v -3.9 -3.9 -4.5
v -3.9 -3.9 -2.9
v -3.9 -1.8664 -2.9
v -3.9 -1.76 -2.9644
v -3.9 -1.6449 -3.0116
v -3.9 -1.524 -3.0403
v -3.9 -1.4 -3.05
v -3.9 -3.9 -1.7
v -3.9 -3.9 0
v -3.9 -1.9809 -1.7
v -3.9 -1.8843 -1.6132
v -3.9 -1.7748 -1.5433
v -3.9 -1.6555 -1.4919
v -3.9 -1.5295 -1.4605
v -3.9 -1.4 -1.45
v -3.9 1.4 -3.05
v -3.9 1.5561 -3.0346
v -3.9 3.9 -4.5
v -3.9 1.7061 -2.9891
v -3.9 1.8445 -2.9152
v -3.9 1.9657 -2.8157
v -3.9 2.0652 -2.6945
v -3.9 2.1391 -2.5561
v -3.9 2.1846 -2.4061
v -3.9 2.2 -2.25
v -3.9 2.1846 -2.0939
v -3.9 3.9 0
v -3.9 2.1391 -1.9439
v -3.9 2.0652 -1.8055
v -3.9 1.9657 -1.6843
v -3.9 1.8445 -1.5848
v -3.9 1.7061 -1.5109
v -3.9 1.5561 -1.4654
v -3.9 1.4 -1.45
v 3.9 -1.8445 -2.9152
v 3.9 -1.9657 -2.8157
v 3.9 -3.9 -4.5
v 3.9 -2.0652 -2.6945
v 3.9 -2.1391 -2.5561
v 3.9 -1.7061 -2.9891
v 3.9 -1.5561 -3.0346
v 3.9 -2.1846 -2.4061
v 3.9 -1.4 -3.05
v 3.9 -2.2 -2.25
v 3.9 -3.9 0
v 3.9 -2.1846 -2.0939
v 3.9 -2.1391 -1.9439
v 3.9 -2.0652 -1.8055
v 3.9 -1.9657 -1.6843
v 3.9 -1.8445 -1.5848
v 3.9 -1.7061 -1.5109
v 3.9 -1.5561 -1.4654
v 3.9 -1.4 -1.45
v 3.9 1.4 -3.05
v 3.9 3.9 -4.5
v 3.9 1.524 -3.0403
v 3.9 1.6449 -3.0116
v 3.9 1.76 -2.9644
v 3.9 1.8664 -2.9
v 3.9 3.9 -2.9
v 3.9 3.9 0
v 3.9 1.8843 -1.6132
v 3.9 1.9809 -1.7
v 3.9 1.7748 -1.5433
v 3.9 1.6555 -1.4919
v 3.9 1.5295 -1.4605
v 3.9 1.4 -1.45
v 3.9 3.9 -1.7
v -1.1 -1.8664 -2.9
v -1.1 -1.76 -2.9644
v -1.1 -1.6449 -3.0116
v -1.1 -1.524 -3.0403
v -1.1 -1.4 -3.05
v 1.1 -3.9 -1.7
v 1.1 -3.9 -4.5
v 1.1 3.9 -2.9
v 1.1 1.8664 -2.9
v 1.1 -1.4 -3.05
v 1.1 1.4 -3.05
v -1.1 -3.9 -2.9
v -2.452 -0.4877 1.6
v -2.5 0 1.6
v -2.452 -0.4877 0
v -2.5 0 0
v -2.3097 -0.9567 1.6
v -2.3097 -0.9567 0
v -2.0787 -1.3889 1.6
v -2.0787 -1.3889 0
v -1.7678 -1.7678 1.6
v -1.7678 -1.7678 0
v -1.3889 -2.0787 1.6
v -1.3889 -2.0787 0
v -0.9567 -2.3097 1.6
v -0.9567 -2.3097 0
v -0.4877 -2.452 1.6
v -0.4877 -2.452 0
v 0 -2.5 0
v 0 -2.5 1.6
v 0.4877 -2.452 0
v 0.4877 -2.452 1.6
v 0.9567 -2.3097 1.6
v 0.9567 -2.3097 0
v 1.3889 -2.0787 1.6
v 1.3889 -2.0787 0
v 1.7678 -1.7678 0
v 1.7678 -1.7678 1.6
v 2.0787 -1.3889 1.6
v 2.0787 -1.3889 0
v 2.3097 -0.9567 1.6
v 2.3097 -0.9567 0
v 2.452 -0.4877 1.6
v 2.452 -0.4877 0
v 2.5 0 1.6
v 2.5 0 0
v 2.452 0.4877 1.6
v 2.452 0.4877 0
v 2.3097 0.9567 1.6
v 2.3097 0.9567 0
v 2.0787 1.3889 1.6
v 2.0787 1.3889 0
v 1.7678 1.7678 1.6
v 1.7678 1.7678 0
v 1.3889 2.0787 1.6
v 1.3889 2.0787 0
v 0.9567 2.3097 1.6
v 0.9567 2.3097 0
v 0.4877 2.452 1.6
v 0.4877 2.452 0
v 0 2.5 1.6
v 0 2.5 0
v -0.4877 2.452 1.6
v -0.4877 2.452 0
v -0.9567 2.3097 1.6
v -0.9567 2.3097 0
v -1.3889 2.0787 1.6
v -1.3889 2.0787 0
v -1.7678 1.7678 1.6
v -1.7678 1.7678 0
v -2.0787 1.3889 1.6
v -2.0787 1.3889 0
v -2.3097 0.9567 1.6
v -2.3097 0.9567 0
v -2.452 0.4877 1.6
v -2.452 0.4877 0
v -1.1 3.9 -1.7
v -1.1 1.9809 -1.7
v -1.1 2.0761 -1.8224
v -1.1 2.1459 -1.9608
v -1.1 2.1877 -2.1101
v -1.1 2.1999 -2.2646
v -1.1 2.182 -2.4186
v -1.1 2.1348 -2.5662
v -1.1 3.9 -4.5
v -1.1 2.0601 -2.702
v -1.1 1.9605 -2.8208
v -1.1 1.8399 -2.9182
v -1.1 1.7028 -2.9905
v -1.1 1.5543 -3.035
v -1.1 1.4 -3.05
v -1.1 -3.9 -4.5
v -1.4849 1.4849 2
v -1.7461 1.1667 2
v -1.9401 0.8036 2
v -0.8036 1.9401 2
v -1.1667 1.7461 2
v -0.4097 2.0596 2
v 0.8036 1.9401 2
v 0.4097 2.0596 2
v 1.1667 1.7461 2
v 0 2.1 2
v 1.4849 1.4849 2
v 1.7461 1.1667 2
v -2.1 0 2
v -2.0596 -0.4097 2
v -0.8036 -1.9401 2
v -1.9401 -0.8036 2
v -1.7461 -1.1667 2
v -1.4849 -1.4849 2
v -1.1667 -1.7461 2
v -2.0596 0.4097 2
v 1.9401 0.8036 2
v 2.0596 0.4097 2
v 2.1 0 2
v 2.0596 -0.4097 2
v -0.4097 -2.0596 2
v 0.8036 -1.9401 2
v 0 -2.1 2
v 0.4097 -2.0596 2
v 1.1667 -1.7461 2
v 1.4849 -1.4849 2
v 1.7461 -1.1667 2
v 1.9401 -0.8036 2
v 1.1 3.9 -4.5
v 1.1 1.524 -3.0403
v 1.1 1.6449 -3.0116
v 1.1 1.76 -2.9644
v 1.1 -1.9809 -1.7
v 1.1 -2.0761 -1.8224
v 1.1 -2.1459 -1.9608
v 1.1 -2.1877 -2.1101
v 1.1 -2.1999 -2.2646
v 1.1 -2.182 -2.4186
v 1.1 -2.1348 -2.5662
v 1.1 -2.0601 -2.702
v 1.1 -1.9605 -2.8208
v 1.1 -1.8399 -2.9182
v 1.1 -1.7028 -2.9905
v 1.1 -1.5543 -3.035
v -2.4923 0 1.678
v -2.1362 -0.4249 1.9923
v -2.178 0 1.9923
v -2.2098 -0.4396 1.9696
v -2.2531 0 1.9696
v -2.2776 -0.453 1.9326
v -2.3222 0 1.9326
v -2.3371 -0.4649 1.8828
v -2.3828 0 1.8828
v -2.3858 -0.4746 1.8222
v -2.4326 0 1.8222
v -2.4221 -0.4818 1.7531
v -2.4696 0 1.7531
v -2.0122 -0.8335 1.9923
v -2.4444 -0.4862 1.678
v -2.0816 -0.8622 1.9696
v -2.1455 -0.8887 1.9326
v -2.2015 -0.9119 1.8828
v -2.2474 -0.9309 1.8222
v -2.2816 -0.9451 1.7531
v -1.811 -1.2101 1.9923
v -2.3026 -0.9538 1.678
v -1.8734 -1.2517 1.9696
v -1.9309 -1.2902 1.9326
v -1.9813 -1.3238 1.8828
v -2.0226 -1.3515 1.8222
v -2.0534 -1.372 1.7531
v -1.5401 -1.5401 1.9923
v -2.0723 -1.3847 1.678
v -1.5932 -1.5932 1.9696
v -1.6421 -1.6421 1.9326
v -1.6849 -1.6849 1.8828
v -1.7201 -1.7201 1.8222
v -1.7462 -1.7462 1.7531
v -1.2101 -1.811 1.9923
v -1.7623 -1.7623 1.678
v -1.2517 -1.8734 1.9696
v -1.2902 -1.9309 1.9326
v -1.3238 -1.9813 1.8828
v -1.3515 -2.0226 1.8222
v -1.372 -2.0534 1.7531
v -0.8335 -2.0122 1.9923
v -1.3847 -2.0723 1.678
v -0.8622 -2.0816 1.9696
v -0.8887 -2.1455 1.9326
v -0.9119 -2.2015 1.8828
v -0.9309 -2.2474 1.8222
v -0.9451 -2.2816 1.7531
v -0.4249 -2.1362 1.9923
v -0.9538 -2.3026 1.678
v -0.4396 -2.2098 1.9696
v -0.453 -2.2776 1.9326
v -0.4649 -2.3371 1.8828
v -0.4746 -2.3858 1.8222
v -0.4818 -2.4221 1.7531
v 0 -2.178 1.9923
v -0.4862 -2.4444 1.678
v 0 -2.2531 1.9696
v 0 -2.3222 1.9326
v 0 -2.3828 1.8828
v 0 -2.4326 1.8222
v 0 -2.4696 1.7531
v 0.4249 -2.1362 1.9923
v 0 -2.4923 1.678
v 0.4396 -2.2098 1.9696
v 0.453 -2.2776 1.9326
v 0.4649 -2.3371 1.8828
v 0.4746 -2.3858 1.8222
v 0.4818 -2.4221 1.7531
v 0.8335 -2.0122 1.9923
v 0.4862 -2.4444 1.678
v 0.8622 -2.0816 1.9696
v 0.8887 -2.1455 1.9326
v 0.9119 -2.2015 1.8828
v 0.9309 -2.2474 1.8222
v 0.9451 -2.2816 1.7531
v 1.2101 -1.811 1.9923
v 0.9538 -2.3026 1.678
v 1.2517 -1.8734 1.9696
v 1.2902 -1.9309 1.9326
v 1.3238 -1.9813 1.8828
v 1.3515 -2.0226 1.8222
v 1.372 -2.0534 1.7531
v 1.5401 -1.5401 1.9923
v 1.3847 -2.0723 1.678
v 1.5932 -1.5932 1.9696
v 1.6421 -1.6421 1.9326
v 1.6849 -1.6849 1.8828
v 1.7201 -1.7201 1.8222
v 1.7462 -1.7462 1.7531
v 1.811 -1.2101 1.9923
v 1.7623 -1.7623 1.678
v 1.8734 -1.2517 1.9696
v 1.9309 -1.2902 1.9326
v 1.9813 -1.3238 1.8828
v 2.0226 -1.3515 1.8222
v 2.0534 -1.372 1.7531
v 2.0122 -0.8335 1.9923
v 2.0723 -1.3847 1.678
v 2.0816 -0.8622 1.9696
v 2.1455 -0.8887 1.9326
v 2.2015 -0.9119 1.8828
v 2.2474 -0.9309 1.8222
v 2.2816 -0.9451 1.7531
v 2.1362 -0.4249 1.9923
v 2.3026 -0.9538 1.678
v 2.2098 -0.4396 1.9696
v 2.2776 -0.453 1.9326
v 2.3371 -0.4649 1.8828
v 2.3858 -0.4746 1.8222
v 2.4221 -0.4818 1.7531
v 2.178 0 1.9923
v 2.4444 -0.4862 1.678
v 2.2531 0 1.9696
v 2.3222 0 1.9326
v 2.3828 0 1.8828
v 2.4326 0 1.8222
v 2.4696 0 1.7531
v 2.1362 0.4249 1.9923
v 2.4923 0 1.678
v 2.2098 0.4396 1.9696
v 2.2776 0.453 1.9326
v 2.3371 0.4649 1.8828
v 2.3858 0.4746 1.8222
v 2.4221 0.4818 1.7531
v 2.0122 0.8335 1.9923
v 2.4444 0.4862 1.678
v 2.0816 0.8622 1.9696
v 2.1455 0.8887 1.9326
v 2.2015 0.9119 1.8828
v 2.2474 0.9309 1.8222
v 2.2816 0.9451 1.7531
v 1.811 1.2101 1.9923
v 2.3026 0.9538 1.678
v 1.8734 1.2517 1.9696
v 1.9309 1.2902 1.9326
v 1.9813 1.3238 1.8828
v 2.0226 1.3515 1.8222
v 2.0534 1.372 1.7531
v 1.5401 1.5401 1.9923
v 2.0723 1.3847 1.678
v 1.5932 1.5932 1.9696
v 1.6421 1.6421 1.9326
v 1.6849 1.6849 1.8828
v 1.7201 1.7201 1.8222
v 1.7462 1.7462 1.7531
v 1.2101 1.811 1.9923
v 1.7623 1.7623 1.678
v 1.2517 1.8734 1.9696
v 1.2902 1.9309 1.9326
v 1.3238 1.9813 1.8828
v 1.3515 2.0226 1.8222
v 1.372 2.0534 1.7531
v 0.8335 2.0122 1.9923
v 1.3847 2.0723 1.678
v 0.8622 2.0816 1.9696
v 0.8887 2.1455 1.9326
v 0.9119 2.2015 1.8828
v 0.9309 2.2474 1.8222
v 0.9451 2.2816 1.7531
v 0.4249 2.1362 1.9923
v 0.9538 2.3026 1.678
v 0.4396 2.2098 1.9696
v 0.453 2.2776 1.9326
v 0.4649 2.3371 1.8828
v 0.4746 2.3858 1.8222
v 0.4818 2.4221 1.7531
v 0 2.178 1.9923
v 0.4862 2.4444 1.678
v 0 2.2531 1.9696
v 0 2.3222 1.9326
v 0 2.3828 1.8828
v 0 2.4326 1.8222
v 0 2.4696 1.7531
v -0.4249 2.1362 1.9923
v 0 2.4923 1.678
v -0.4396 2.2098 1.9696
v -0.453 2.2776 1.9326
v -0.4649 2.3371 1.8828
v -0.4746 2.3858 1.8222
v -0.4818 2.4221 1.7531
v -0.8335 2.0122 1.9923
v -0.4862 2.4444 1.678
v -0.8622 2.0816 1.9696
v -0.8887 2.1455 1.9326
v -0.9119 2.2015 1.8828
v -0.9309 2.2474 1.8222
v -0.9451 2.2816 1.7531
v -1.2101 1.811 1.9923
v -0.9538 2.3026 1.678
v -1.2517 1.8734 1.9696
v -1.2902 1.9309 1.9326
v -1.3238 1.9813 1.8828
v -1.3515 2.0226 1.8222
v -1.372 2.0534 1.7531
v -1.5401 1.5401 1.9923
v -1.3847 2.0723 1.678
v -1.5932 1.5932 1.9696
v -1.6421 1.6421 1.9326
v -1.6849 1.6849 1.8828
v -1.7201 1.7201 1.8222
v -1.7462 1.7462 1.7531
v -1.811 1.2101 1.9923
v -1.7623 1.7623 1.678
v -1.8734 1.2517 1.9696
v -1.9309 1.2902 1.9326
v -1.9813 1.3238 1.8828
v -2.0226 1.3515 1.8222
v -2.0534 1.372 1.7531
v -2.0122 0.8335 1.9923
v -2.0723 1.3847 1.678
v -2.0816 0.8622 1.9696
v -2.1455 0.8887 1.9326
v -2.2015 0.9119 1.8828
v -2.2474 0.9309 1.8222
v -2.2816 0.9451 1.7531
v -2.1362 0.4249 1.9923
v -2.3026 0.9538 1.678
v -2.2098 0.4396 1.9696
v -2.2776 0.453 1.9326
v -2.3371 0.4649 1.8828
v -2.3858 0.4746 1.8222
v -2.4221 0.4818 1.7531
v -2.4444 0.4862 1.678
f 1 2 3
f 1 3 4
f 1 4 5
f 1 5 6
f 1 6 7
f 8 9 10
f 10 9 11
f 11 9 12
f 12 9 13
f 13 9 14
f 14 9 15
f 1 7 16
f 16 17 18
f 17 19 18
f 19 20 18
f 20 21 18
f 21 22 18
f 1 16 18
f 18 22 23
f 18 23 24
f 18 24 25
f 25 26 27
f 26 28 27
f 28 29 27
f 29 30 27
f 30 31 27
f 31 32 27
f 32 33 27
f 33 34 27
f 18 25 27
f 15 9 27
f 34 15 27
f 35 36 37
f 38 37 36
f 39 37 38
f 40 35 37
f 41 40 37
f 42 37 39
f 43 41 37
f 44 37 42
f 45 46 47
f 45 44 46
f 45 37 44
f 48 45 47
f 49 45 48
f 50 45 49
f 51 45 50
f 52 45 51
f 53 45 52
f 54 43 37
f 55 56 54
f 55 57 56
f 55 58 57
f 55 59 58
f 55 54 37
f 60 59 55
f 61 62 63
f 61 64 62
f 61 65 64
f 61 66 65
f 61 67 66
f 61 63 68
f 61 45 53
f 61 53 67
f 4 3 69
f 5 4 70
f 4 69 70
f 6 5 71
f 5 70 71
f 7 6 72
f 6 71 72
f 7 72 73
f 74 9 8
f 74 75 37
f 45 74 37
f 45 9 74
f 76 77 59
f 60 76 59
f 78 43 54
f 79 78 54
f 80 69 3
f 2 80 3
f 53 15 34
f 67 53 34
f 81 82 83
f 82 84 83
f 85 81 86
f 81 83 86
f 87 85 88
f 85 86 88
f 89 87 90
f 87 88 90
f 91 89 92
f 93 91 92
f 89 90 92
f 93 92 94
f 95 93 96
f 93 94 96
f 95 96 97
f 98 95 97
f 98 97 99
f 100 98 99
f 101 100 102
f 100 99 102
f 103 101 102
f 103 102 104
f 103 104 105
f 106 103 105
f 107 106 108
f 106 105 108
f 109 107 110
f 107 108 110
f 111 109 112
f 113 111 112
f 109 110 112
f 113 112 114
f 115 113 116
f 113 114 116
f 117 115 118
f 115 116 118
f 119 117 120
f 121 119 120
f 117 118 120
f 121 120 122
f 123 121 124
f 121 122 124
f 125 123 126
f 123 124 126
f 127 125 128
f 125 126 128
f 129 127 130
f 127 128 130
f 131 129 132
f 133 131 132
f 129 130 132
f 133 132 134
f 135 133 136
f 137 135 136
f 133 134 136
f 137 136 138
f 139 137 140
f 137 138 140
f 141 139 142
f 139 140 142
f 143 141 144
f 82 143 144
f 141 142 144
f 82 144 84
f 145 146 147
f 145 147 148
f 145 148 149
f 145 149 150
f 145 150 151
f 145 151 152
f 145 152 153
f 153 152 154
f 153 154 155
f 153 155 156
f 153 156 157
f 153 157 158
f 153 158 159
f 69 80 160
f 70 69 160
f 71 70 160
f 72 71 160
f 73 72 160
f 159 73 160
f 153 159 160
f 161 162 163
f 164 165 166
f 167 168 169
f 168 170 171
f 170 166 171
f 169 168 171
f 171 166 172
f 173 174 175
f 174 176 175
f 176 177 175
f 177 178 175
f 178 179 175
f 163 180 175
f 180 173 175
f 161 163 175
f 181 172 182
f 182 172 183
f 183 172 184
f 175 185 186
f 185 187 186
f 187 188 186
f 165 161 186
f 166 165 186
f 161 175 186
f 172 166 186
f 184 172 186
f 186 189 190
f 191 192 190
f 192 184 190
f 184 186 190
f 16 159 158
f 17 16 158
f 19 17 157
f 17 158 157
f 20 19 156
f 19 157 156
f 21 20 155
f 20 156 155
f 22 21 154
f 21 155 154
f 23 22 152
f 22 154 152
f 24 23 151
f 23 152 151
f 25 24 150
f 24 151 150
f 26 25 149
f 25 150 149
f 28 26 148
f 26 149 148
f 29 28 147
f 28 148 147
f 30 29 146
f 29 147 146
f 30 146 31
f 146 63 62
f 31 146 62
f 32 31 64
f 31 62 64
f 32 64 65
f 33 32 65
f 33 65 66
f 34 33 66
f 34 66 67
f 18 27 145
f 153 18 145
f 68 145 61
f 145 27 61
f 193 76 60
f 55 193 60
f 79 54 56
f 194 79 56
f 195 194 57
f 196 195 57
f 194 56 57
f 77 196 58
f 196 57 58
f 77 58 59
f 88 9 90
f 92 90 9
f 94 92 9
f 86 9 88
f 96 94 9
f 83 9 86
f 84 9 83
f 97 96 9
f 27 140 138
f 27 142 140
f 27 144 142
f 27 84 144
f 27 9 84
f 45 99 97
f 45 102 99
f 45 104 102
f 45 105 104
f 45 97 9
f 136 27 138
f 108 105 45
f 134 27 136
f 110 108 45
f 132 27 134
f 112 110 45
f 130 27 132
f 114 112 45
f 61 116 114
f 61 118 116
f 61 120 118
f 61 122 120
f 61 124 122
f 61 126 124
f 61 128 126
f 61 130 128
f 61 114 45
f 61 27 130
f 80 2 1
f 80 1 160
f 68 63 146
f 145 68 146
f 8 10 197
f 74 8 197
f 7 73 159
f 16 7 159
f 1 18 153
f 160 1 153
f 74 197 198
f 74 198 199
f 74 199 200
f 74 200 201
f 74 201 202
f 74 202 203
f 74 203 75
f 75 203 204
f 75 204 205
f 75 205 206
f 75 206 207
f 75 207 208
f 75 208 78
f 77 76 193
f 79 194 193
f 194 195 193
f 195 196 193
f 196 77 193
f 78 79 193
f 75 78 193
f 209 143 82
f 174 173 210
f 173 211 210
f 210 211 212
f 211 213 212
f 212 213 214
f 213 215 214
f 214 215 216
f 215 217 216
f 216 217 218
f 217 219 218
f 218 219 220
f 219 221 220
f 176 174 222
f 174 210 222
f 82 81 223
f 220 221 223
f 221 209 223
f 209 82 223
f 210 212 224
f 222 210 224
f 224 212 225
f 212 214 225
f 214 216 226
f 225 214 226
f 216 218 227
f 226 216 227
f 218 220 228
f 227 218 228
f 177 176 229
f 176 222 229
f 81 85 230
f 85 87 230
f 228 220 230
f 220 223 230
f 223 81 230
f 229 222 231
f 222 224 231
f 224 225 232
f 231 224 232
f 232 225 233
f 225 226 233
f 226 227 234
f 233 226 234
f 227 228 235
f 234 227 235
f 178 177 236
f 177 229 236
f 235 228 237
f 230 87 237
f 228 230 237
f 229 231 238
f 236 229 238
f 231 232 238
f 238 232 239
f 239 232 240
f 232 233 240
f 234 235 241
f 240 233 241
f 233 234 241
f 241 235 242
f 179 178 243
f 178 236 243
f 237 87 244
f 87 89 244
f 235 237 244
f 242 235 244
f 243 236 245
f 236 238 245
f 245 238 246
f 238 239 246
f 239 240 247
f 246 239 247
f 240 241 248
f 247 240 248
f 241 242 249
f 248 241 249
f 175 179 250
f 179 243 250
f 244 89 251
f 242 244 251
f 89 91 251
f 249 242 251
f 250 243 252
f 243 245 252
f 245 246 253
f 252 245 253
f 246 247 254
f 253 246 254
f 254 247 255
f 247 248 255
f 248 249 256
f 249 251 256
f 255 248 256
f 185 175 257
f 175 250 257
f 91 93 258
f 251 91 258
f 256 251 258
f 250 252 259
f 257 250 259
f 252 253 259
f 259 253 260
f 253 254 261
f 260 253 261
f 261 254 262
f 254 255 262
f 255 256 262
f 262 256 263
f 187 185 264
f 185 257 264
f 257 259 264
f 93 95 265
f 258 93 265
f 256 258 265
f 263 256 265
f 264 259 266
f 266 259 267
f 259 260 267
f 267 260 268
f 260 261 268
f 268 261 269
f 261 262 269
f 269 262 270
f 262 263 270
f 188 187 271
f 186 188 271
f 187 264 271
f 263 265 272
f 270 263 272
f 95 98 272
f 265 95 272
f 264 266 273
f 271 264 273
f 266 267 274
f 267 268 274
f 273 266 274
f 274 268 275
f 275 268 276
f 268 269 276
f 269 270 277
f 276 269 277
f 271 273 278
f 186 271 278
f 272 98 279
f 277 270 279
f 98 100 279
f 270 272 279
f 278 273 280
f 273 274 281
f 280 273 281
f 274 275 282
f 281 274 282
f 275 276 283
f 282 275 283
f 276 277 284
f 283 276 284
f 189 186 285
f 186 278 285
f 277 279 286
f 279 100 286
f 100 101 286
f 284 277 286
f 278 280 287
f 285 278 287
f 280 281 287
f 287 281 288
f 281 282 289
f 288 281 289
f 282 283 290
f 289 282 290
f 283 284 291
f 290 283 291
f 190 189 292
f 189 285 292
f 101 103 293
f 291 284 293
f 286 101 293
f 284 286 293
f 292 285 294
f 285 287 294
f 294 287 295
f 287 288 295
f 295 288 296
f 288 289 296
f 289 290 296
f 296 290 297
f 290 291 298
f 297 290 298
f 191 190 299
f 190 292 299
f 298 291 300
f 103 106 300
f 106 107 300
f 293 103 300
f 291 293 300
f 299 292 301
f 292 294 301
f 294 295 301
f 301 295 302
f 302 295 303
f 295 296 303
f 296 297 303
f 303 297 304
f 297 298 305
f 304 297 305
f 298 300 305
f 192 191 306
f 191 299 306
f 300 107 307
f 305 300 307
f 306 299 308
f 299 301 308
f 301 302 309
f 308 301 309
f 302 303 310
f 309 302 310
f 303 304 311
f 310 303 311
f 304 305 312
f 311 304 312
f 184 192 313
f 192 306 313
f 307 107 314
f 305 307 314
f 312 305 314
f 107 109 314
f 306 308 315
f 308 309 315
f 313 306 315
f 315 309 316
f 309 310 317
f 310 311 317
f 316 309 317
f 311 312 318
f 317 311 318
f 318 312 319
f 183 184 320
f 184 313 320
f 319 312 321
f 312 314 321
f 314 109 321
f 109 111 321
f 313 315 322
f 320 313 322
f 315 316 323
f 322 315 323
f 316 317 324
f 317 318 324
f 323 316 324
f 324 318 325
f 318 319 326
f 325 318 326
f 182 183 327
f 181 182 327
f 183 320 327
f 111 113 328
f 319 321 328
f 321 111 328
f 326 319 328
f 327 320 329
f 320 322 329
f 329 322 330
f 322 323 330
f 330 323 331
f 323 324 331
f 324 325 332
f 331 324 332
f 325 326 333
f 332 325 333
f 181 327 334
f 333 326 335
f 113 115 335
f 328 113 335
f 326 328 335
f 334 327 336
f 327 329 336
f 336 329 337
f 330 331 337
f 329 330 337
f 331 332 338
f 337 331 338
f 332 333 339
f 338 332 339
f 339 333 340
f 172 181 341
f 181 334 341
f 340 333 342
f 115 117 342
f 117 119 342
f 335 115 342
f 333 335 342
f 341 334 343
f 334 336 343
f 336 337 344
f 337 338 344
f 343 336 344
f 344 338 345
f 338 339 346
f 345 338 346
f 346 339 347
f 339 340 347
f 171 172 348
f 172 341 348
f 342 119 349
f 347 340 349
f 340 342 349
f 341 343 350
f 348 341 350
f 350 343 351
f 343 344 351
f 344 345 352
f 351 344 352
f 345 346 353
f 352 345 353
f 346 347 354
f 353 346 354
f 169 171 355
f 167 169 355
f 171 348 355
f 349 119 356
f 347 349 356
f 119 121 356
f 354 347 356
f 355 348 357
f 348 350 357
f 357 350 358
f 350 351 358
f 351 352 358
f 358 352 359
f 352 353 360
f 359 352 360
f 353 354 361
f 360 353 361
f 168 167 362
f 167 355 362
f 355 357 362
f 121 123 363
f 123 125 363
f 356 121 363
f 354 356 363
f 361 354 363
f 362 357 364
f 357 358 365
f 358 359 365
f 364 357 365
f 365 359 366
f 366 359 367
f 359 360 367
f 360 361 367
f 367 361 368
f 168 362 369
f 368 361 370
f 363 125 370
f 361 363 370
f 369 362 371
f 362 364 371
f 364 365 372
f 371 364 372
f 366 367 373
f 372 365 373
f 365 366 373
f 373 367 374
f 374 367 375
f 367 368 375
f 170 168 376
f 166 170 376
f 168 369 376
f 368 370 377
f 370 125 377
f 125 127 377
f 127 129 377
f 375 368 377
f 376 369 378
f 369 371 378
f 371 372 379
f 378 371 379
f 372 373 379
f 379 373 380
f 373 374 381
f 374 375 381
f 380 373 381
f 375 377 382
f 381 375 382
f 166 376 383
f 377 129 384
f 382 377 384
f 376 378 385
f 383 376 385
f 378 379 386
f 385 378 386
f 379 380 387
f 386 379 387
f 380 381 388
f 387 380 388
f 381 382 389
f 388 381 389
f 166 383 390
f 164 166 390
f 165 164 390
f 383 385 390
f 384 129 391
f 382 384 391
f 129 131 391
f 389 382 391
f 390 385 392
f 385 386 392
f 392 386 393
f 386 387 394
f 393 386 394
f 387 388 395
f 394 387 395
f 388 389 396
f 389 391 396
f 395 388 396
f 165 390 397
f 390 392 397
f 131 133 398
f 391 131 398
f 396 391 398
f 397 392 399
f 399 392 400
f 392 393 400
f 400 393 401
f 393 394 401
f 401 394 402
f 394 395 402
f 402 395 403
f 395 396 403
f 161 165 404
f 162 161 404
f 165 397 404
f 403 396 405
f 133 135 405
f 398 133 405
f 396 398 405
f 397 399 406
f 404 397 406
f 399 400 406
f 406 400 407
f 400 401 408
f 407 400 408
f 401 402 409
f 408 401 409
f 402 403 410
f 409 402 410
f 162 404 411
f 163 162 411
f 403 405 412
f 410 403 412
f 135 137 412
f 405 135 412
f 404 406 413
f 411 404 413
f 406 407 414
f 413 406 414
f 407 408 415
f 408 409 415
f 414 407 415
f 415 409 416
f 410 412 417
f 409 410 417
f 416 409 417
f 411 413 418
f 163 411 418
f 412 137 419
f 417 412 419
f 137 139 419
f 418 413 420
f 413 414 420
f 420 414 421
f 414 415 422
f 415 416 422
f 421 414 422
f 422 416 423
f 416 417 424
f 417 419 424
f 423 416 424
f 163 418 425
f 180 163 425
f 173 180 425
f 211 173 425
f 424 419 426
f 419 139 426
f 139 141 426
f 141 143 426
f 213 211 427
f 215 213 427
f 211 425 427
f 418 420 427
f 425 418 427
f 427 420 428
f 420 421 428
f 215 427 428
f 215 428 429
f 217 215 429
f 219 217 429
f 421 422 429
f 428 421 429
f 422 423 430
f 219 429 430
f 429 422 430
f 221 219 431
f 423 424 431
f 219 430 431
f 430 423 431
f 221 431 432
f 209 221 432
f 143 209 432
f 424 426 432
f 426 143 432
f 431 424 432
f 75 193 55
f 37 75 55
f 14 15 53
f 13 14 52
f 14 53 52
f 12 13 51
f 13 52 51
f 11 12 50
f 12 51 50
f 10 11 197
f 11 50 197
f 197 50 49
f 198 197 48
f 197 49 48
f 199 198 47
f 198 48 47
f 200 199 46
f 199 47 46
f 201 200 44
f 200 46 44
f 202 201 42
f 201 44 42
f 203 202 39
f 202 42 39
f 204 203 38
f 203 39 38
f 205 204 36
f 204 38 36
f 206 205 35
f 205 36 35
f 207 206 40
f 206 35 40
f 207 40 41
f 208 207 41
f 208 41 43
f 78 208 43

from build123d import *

# Parameters (mm, degrees)
SKETCH001_W     = 7.8
SKETCH001_H     = 7.8
PAD_DEPTH       = 4.5
POCKET_DEPTH    = 5
POCKET001_DEPTH = 5
POCKET002_DEPTH = 5


with BuildPart() as part:
    # Sketch → Revolution (revolve)
    with BuildSketch(Plane.XZ):
        with BuildLine():
            Line((0, 0), (0, 2))
            Line((0, 2), (-2.1, 2))
            ThreePointArc((-2.1, 2), (-2.382843, 1.882843), (-2.5, 1.6))
            Line((-2.5, 1.6), (-2.5, 0))
            Line((-2.5, 0), (0, 0))
        make_face()
    revolve(axis=Axis((0, 0, 0), (0, 0, 1)))

    # Sketch001 → Pad (new body)
    with BuildSketch(Plane.XY):
        Rectangle(SKETCH001_W, SKETCH001_H)
    extrude(amount=-PAD_DEPTH)

    # Sketch002 → Pocket (cut, symmetric)
    with BuildSketch(Plane.YZ):
        with BuildLine():
            ThreePointArc((-1.4, -1.45), (-2.2, -2.25), (-1.4, -3.05))
            Line((-1.4, -3.05), (1.4, -3.05))
            ThreePointArc((1.4, -3.05), (2.2, -2.25), (1.4, -1.45))
            Line((-1.4, -1.45), (1.4, -1.45))
        make_face()
    extrude(amount=POCKET_DEPTH, both=True, mode=Mode.SUBTRACT)

    # Sketch003 → Pocket001 (cut)
    with BuildSketch(Plane.XZ):
        Polygon((1.1, -5.9), (-1.1, -5.9), (-1.1, -2.9), (-5.1, -2.9), (-5.1, -1.7), (1.1, -1.7), align=None)
    extrude(amount=POCKET001_DEPTH, mode=Mode.SUBTRACT)

    # Sketch004 → Pocket002 (cut)
    with BuildSketch(Plane.XZ):
        Polygon((-1.1, -1.7), (-1.1, -6.7), (1.1, -6.7), (1.1, -2.9), (5.1, -2.9), (5.1, -1.7), align=None)
    extrude(amount=-POCKET002_DEPTH, mode=Mode.SUBTRACT)


solid = part.part
